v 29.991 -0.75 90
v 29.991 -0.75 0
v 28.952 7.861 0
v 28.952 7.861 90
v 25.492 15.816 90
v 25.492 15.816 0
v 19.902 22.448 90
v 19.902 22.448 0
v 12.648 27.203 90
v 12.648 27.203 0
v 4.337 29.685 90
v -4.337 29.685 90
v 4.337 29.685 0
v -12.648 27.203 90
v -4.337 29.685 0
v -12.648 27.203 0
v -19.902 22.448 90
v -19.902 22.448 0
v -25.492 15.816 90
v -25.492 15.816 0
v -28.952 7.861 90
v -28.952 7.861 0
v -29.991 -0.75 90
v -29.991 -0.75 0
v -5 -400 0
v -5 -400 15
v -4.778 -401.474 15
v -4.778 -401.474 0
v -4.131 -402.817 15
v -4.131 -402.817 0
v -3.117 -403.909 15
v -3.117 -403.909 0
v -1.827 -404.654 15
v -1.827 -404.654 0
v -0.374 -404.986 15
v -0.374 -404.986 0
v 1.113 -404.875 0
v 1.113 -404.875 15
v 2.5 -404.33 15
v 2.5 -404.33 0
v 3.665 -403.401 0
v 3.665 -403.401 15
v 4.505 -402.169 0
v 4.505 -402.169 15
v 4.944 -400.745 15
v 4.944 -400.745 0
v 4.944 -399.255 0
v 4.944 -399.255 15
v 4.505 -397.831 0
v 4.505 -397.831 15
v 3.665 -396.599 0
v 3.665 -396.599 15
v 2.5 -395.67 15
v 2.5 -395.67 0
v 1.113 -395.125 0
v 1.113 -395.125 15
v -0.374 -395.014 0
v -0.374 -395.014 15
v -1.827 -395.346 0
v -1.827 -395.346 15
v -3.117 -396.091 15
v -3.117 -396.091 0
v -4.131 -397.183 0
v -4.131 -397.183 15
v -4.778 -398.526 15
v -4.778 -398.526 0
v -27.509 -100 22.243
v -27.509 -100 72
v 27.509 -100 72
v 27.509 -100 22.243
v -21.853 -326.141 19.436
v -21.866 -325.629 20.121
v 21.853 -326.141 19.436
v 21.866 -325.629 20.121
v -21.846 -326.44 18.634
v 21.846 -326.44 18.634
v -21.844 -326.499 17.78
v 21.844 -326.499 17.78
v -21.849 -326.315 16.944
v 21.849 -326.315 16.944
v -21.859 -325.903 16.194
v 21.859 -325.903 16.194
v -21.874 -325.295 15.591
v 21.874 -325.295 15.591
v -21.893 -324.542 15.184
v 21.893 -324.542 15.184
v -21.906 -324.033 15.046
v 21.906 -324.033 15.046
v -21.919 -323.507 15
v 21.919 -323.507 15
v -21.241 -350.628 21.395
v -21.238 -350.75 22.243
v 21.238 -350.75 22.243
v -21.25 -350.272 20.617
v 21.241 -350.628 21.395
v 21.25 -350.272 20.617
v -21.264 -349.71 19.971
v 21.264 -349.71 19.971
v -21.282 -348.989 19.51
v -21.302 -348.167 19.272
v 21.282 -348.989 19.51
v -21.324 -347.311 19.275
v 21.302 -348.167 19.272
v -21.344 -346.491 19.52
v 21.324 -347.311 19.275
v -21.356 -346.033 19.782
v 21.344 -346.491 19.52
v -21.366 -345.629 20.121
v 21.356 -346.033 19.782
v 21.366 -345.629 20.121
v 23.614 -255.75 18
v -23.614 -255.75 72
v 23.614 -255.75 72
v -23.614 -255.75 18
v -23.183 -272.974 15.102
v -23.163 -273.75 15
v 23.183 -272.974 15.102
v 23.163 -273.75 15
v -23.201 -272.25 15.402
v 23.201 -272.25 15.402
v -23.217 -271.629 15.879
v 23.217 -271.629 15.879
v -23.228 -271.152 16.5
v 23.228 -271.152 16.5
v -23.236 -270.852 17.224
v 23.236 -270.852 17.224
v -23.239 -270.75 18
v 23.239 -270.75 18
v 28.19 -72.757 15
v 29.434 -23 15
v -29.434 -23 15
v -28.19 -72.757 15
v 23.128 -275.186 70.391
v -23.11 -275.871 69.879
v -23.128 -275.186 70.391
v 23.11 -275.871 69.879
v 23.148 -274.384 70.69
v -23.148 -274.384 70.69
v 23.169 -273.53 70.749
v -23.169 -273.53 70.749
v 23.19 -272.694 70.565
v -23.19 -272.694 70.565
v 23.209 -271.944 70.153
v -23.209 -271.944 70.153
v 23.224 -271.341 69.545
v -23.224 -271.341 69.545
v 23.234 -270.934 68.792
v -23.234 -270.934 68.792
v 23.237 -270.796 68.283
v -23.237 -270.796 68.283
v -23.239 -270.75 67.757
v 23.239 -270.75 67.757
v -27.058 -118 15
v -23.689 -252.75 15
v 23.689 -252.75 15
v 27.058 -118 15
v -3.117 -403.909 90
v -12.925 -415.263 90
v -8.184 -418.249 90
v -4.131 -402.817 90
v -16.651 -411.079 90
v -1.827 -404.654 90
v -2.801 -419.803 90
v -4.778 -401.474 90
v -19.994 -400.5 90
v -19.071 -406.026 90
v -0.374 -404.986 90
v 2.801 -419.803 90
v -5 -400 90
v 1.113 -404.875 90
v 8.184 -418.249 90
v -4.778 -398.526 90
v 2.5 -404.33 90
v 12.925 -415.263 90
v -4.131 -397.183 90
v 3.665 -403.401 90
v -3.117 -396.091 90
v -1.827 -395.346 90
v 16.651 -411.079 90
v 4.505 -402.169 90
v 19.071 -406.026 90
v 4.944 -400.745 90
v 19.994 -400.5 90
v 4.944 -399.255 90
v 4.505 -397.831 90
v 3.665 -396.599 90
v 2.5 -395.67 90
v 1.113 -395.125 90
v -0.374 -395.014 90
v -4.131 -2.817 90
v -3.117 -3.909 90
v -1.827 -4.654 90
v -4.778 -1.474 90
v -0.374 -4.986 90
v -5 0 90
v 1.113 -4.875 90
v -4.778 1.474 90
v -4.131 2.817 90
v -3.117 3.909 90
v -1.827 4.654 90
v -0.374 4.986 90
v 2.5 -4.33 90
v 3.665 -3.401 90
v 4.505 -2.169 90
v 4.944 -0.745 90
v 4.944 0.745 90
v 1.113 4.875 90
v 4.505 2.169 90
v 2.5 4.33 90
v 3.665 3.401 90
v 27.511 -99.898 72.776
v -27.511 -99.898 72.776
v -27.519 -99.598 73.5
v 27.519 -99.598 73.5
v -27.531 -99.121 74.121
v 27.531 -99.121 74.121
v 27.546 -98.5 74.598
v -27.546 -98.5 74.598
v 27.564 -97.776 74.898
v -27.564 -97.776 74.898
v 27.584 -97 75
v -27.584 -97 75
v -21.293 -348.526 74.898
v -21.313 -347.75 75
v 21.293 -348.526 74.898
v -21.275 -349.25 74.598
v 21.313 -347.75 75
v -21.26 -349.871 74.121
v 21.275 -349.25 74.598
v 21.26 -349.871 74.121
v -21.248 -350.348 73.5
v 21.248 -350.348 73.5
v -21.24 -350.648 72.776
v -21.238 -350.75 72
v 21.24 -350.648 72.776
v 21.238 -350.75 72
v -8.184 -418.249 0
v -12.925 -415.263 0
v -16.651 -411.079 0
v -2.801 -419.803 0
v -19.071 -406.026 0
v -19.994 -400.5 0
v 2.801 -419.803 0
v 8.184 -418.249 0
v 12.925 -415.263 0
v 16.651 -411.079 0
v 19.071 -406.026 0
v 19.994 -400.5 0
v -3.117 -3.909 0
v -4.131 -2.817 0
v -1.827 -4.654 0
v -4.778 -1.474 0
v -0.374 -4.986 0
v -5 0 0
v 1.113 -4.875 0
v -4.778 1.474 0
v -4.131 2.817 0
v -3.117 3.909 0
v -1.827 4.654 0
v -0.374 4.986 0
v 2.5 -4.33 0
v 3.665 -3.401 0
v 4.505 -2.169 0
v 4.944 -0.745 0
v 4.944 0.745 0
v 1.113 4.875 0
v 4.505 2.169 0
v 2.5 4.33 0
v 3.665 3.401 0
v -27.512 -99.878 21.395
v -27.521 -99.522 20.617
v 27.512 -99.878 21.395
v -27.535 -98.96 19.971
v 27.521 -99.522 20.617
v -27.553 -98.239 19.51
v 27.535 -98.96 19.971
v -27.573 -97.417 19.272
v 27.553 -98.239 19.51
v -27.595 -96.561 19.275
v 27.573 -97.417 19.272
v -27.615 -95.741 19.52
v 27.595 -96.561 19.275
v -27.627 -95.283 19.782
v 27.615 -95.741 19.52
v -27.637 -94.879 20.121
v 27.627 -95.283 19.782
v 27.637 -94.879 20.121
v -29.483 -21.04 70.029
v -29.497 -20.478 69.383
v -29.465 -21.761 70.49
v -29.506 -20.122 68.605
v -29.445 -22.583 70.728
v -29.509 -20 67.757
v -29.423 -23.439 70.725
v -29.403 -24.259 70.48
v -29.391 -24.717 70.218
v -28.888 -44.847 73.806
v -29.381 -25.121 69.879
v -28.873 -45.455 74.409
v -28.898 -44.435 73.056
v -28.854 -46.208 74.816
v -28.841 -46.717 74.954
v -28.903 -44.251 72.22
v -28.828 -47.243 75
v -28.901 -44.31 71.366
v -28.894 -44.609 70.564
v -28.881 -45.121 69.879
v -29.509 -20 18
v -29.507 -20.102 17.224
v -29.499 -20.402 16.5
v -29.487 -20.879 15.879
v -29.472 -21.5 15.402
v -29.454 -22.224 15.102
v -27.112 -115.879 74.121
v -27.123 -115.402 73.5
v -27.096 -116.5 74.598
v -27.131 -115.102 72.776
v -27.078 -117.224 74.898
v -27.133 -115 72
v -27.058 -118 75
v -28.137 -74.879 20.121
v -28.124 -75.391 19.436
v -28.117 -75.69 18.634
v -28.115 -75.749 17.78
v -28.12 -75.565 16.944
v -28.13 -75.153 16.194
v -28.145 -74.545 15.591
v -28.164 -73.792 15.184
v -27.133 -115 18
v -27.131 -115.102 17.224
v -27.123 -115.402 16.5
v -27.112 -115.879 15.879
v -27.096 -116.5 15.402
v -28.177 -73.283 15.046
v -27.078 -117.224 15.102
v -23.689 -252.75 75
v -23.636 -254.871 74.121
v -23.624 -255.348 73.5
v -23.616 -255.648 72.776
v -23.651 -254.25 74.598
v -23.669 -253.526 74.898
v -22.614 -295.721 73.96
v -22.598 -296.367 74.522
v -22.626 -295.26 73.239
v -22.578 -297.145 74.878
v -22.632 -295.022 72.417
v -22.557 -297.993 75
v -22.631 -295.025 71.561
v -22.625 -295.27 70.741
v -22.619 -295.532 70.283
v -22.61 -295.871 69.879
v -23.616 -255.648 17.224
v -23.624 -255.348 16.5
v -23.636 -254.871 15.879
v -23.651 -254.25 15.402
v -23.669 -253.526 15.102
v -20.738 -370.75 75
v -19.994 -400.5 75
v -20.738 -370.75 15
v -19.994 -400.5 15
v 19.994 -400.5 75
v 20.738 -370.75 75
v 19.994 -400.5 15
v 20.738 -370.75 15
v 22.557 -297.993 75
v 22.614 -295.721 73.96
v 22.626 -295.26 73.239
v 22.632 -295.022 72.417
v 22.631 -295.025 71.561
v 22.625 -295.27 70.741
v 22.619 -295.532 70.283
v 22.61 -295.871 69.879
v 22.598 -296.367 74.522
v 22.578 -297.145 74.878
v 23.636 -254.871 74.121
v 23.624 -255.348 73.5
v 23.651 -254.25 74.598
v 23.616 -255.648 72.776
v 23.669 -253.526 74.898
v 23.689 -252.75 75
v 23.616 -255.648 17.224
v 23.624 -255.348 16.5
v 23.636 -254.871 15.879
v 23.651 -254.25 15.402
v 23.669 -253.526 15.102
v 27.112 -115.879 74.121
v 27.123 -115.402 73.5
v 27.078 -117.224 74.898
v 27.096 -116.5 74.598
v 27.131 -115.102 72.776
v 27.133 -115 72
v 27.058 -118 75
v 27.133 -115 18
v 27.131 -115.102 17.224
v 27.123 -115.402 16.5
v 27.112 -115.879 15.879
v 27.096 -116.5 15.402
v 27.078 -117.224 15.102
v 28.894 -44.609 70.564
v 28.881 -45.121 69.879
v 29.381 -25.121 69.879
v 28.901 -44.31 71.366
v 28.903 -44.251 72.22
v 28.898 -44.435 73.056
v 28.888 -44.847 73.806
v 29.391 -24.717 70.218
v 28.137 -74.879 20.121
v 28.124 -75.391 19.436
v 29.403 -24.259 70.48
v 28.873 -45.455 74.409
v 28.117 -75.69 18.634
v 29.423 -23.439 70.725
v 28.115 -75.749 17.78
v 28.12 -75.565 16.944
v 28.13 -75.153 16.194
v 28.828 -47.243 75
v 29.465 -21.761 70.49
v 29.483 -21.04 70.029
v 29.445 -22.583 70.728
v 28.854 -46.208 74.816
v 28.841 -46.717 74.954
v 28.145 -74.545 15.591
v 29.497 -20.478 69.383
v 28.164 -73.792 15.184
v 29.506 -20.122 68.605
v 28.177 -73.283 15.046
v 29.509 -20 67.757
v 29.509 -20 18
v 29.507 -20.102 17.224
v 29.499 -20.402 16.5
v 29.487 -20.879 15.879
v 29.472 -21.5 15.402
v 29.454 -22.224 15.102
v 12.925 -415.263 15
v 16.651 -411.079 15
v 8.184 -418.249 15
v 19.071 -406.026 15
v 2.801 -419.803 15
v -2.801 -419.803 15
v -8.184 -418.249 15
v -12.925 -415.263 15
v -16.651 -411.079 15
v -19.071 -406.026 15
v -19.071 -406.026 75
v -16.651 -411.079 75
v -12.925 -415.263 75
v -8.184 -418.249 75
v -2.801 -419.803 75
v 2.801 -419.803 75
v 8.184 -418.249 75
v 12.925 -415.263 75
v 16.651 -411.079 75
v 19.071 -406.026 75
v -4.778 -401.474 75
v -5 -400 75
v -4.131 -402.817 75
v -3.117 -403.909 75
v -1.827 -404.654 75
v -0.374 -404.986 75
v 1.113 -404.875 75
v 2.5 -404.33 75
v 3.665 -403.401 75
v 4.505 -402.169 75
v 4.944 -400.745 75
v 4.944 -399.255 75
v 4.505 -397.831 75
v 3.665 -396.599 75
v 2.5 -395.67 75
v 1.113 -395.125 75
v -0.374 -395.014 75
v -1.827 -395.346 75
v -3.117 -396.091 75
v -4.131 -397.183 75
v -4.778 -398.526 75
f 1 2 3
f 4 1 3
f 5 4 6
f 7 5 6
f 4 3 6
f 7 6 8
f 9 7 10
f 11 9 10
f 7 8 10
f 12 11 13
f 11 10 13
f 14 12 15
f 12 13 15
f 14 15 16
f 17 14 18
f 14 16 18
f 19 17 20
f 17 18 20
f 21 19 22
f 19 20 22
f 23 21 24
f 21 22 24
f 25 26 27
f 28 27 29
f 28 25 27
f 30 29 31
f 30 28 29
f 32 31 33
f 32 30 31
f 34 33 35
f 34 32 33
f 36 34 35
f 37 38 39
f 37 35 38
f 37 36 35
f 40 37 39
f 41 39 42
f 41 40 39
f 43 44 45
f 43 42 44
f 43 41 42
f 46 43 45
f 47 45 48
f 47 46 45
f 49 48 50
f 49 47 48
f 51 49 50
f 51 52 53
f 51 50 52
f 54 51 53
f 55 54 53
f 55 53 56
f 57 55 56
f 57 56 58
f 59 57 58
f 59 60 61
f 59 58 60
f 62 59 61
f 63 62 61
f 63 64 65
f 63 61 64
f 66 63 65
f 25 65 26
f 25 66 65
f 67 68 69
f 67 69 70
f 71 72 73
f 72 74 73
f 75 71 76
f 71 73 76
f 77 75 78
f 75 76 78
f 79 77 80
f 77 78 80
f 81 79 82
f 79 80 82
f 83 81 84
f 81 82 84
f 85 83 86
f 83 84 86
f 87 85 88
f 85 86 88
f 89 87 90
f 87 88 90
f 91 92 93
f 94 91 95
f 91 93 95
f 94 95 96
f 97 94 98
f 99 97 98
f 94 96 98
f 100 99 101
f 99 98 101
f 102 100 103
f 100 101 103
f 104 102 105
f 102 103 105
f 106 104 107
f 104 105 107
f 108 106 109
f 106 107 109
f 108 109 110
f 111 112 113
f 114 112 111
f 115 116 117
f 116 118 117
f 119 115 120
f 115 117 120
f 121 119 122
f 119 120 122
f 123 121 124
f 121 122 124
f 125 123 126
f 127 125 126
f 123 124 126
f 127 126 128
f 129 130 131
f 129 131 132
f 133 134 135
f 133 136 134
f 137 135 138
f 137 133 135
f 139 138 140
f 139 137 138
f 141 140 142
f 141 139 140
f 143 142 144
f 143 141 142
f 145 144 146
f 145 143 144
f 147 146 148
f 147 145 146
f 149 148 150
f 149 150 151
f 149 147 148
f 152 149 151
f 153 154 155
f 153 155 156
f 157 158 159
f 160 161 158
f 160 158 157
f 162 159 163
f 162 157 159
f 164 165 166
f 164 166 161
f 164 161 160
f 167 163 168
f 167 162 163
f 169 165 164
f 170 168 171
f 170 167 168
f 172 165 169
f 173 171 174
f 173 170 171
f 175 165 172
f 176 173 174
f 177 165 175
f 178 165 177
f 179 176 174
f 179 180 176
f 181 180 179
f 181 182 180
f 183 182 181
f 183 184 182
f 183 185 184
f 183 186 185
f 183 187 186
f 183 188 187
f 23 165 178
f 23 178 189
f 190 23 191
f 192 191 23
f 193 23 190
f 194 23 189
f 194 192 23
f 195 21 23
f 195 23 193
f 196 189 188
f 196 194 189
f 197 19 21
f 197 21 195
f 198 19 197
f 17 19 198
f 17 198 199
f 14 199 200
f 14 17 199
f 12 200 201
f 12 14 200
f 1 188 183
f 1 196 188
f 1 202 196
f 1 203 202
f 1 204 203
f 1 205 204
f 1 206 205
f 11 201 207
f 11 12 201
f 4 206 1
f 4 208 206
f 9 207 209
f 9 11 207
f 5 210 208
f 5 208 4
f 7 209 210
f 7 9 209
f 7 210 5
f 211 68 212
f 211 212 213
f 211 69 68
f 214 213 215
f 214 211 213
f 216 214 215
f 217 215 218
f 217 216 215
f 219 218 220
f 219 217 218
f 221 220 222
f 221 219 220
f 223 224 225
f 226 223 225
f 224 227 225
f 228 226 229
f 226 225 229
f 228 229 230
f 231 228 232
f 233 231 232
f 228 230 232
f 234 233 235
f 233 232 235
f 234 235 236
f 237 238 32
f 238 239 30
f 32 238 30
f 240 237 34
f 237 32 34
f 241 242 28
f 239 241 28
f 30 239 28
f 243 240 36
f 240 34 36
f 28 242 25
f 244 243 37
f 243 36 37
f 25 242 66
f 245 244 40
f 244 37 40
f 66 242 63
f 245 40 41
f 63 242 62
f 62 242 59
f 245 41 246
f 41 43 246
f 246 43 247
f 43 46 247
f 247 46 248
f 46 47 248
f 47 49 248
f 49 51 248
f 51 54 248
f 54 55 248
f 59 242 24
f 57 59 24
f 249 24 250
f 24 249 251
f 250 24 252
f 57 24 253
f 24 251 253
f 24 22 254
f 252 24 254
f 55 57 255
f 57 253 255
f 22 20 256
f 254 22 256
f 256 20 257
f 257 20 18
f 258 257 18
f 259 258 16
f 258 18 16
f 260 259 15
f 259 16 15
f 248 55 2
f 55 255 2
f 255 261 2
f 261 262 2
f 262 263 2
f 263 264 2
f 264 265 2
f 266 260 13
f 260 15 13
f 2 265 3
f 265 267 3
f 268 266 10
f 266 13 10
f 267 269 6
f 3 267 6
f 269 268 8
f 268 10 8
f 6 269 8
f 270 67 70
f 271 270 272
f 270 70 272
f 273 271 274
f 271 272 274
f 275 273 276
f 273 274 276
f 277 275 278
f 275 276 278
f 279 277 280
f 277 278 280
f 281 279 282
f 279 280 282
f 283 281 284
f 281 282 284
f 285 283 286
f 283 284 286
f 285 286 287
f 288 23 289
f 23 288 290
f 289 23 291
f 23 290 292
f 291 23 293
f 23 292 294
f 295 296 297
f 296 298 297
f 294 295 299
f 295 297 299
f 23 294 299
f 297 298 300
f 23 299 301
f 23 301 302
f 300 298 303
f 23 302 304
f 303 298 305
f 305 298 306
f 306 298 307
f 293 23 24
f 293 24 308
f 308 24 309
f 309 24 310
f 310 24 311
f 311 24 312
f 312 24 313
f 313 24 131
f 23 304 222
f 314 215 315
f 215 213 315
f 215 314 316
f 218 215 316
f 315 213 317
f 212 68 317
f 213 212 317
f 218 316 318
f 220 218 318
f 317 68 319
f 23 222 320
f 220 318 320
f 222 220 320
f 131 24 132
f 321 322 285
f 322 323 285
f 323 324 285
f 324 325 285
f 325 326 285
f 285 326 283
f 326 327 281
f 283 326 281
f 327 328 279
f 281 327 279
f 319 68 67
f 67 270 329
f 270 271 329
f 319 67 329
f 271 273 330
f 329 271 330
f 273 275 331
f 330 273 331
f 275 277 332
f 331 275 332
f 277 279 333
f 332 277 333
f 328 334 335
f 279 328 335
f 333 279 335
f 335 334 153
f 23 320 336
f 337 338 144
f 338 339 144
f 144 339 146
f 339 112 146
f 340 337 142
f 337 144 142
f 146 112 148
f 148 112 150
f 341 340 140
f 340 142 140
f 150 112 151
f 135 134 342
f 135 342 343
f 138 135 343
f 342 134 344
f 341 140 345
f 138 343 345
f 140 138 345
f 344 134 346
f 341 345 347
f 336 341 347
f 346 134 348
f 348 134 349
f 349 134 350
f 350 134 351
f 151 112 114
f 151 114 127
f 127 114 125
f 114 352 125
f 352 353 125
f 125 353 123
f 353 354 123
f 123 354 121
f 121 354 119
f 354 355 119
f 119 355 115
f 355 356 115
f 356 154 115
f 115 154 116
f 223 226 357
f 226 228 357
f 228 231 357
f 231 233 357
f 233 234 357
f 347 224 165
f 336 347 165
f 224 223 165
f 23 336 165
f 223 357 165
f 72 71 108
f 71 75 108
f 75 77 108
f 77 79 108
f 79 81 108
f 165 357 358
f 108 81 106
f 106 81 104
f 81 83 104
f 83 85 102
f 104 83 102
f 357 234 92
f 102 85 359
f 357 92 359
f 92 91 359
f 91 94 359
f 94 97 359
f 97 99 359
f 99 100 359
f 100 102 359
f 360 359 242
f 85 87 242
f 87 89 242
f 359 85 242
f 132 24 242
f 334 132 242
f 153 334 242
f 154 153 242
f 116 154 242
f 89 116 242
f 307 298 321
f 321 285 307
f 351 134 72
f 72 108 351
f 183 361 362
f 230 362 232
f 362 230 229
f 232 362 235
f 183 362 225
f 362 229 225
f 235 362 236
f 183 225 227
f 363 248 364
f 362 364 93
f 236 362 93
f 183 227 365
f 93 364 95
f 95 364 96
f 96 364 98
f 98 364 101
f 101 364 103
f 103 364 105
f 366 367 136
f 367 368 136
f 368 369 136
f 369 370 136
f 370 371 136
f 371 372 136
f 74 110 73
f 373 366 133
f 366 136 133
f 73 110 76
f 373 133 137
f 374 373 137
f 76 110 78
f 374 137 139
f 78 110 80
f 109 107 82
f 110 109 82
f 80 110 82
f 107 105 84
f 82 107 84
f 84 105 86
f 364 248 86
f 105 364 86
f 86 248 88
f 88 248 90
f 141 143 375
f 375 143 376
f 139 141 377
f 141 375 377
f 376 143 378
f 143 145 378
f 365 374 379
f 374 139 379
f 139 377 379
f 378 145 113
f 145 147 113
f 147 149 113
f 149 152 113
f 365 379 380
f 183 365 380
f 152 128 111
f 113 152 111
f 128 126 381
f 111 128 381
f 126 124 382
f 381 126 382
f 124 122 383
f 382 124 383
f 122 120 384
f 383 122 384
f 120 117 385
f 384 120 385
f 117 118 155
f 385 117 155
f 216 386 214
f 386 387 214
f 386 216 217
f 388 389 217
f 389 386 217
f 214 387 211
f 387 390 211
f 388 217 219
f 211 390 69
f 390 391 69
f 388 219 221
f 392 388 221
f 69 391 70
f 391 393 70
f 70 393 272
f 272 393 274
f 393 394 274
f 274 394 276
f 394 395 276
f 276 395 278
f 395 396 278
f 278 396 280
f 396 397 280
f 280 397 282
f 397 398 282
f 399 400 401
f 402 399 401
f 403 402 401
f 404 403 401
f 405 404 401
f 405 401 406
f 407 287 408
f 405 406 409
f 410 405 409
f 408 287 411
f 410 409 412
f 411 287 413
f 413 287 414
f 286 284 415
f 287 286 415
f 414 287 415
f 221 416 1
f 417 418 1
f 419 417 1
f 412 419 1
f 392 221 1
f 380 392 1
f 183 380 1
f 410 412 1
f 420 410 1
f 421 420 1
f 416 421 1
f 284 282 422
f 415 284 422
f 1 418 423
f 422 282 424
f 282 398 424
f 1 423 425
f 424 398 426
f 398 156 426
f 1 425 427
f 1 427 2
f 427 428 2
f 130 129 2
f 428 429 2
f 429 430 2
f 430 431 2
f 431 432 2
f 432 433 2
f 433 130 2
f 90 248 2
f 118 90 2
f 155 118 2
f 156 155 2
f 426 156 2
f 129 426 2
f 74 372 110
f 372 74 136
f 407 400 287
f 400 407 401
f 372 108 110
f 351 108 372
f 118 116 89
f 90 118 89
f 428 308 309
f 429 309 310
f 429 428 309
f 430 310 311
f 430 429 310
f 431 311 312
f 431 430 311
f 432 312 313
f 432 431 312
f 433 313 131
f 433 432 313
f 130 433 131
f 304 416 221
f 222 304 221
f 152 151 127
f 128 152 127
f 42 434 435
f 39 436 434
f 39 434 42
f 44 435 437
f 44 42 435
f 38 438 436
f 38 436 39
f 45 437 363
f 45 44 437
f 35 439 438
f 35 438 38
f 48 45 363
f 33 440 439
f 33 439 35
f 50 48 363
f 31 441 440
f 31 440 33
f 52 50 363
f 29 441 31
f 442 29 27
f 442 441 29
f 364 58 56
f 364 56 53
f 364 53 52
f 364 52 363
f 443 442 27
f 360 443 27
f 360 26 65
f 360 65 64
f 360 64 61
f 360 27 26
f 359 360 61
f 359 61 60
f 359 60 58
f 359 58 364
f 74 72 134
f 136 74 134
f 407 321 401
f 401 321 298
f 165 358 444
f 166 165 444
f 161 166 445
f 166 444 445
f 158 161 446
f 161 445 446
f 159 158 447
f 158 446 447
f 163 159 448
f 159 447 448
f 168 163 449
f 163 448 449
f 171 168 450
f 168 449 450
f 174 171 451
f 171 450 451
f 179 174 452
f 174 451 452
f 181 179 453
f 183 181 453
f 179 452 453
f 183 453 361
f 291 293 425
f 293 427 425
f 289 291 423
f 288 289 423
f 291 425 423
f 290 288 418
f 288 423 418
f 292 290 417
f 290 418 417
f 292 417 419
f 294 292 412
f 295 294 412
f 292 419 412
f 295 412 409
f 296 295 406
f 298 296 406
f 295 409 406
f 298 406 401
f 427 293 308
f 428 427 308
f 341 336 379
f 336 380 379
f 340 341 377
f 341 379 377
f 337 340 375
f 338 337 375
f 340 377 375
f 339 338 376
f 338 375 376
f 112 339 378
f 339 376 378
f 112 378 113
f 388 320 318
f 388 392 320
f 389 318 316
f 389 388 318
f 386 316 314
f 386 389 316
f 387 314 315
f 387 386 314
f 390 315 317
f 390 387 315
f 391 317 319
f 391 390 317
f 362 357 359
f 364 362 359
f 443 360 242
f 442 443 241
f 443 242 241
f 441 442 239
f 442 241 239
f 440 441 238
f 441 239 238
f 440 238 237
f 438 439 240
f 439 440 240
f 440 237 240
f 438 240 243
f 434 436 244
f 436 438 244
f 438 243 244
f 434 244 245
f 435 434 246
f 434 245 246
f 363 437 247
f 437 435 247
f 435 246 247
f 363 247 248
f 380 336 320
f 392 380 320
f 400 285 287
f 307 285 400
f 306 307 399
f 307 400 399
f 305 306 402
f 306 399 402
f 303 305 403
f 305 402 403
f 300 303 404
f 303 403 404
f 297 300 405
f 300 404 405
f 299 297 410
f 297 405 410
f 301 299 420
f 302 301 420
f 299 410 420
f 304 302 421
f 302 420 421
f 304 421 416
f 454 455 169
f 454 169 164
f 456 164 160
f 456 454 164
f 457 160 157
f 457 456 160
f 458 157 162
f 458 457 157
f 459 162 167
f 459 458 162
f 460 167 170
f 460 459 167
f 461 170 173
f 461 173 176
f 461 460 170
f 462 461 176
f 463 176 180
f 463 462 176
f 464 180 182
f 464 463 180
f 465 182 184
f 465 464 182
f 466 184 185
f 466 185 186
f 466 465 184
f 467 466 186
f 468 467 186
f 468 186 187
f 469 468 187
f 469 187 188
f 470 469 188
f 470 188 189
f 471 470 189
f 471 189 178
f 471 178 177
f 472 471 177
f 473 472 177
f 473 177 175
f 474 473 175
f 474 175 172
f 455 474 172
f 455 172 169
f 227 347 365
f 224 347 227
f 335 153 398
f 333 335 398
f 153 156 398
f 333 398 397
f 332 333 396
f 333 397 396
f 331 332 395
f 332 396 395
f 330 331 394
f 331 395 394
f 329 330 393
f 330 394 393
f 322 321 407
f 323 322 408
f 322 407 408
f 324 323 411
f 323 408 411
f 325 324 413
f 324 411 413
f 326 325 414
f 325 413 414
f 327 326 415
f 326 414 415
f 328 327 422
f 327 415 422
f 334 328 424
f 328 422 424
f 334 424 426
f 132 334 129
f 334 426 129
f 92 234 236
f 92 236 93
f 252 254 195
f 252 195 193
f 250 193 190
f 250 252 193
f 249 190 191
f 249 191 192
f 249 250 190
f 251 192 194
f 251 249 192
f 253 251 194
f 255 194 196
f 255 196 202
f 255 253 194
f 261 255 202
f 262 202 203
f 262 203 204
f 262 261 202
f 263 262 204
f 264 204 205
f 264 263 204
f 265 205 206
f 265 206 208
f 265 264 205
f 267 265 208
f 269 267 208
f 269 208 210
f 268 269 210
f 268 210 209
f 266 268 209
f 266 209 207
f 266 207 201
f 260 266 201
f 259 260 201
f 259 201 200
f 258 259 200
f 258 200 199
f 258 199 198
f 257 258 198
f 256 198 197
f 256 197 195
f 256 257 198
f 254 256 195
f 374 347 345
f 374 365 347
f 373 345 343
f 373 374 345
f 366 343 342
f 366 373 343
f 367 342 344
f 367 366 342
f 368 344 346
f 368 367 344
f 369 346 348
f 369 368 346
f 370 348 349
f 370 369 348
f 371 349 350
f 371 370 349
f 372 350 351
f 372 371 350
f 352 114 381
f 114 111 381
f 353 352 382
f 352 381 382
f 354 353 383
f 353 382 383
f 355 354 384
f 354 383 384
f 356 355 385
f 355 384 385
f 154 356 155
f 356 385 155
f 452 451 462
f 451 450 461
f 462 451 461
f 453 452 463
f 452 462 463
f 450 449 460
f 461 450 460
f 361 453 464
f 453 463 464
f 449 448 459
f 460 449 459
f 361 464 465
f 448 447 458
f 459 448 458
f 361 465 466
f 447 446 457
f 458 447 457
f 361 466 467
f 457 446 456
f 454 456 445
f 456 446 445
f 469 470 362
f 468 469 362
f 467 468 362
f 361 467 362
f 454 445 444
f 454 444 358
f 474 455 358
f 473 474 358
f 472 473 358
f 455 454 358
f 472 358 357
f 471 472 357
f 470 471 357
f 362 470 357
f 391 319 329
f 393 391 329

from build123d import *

# Parameters (mm, degrees)
SKETCH_1_R               = 5
EXTRUDE_1_DEPTH          = 90
CUT_EXTRUDE_1_DEPTH      = 431.581002832
CUT_EXTRUDE_1_DEPTH_BACK = 431.581002832
SKETCH_2_W               = 60
SKETCH_2_H               = 150
SKETCH_2_H_2             = 140.75
FILLET_1_R               = 3


with BuildPart() as part:
    # 草图1 → 凸台-拉伸1 (new body)
    with BuildSketch(Plane.XY):
        with BuildLine():
            Line((-29.990623535, -0.75), (-19.993749023, -400.5))
            ThreePointArc((-19.993749023, -400.5), (0, -420), (19.993749023, -400.5))
            Line((19.993749023, -400.5), (29.990623535, -0.75))
            ThreePointArc((29.990623535, -0.75), (0, 30), (-29.990623535, -0.75))
        make_face()
        with Locations(Location((0, 0, 0), (0, 0, 180))):
            Circle(SKETCH_1_R, mode=Mode.SUBTRACT)
        with Locations(Location((0, -400, 0), (0, 0, 180))):
            Circle(SKETCH_1_R, mode=Mode.SUBTRACT)
    extrude(amount=EXTRUDE_1_DEPTH)

    # 草图2 → 切除-拉伸1 (cut, two sides: drawn at the far end of the back side and taken through both)
    with BuildSketch(Plane(origin=(0, 0, 0), x_dir=(0, 0, -1), z_dir=(1, 0, 0)).offset(-CUT_EXTRUDE_1_DEPTH_BACK)):
        with Locations((-45, -445.75)):
            Rectangle(SKETCH_2_W, SKETCH_2_H)
        Polygon((-75, -20), (-15, -20), (-15, -80), align=None)
        Polygon((-75, -40), (-75, -100), (-15, -100), align=None)
        Polygon((-15, -330.75), (-75, -270.75), (-15, -270.75), align=None)
        Polygon((-15, -350.75), (-75, -290.75), (-75, -350.75), align=None)
        with Locations((-45, -185.375)):
            Rectangle(SKETCH_2_W, SKETCH_2_H_2)
    extrude(amount=CUT_EXTRUDE_1_DEPTH + CUT_EXTRUDE_1_DEPTH_BACK, mode=Mode.SUBTRACT)

    # 圆角1
    fillet_1_edges = [part.edges().sort_by_distance(p)[0] for p in [
        (0, -270.75, 75),
        (0, -270.75, 15),
        (0, -330.75, 15),
        (0, -255.75, 75),
        (0, -115, 75),
        (0, -115, 15),
        (0, -255.75, 15),
        (0, -350.75, 15),
        (0, -350.75, 75),
        (0, -290.75, 75),
        (0, -40, 75),
        (0, -100, 15),
        (0, -100, 75),
        (0, -80, 15),
        (0, -20, 75),
        (0, -20, 15),
    ]]
    fillet(fillet_1_edges, radius=FILLET_1_R)


solid = part.part
